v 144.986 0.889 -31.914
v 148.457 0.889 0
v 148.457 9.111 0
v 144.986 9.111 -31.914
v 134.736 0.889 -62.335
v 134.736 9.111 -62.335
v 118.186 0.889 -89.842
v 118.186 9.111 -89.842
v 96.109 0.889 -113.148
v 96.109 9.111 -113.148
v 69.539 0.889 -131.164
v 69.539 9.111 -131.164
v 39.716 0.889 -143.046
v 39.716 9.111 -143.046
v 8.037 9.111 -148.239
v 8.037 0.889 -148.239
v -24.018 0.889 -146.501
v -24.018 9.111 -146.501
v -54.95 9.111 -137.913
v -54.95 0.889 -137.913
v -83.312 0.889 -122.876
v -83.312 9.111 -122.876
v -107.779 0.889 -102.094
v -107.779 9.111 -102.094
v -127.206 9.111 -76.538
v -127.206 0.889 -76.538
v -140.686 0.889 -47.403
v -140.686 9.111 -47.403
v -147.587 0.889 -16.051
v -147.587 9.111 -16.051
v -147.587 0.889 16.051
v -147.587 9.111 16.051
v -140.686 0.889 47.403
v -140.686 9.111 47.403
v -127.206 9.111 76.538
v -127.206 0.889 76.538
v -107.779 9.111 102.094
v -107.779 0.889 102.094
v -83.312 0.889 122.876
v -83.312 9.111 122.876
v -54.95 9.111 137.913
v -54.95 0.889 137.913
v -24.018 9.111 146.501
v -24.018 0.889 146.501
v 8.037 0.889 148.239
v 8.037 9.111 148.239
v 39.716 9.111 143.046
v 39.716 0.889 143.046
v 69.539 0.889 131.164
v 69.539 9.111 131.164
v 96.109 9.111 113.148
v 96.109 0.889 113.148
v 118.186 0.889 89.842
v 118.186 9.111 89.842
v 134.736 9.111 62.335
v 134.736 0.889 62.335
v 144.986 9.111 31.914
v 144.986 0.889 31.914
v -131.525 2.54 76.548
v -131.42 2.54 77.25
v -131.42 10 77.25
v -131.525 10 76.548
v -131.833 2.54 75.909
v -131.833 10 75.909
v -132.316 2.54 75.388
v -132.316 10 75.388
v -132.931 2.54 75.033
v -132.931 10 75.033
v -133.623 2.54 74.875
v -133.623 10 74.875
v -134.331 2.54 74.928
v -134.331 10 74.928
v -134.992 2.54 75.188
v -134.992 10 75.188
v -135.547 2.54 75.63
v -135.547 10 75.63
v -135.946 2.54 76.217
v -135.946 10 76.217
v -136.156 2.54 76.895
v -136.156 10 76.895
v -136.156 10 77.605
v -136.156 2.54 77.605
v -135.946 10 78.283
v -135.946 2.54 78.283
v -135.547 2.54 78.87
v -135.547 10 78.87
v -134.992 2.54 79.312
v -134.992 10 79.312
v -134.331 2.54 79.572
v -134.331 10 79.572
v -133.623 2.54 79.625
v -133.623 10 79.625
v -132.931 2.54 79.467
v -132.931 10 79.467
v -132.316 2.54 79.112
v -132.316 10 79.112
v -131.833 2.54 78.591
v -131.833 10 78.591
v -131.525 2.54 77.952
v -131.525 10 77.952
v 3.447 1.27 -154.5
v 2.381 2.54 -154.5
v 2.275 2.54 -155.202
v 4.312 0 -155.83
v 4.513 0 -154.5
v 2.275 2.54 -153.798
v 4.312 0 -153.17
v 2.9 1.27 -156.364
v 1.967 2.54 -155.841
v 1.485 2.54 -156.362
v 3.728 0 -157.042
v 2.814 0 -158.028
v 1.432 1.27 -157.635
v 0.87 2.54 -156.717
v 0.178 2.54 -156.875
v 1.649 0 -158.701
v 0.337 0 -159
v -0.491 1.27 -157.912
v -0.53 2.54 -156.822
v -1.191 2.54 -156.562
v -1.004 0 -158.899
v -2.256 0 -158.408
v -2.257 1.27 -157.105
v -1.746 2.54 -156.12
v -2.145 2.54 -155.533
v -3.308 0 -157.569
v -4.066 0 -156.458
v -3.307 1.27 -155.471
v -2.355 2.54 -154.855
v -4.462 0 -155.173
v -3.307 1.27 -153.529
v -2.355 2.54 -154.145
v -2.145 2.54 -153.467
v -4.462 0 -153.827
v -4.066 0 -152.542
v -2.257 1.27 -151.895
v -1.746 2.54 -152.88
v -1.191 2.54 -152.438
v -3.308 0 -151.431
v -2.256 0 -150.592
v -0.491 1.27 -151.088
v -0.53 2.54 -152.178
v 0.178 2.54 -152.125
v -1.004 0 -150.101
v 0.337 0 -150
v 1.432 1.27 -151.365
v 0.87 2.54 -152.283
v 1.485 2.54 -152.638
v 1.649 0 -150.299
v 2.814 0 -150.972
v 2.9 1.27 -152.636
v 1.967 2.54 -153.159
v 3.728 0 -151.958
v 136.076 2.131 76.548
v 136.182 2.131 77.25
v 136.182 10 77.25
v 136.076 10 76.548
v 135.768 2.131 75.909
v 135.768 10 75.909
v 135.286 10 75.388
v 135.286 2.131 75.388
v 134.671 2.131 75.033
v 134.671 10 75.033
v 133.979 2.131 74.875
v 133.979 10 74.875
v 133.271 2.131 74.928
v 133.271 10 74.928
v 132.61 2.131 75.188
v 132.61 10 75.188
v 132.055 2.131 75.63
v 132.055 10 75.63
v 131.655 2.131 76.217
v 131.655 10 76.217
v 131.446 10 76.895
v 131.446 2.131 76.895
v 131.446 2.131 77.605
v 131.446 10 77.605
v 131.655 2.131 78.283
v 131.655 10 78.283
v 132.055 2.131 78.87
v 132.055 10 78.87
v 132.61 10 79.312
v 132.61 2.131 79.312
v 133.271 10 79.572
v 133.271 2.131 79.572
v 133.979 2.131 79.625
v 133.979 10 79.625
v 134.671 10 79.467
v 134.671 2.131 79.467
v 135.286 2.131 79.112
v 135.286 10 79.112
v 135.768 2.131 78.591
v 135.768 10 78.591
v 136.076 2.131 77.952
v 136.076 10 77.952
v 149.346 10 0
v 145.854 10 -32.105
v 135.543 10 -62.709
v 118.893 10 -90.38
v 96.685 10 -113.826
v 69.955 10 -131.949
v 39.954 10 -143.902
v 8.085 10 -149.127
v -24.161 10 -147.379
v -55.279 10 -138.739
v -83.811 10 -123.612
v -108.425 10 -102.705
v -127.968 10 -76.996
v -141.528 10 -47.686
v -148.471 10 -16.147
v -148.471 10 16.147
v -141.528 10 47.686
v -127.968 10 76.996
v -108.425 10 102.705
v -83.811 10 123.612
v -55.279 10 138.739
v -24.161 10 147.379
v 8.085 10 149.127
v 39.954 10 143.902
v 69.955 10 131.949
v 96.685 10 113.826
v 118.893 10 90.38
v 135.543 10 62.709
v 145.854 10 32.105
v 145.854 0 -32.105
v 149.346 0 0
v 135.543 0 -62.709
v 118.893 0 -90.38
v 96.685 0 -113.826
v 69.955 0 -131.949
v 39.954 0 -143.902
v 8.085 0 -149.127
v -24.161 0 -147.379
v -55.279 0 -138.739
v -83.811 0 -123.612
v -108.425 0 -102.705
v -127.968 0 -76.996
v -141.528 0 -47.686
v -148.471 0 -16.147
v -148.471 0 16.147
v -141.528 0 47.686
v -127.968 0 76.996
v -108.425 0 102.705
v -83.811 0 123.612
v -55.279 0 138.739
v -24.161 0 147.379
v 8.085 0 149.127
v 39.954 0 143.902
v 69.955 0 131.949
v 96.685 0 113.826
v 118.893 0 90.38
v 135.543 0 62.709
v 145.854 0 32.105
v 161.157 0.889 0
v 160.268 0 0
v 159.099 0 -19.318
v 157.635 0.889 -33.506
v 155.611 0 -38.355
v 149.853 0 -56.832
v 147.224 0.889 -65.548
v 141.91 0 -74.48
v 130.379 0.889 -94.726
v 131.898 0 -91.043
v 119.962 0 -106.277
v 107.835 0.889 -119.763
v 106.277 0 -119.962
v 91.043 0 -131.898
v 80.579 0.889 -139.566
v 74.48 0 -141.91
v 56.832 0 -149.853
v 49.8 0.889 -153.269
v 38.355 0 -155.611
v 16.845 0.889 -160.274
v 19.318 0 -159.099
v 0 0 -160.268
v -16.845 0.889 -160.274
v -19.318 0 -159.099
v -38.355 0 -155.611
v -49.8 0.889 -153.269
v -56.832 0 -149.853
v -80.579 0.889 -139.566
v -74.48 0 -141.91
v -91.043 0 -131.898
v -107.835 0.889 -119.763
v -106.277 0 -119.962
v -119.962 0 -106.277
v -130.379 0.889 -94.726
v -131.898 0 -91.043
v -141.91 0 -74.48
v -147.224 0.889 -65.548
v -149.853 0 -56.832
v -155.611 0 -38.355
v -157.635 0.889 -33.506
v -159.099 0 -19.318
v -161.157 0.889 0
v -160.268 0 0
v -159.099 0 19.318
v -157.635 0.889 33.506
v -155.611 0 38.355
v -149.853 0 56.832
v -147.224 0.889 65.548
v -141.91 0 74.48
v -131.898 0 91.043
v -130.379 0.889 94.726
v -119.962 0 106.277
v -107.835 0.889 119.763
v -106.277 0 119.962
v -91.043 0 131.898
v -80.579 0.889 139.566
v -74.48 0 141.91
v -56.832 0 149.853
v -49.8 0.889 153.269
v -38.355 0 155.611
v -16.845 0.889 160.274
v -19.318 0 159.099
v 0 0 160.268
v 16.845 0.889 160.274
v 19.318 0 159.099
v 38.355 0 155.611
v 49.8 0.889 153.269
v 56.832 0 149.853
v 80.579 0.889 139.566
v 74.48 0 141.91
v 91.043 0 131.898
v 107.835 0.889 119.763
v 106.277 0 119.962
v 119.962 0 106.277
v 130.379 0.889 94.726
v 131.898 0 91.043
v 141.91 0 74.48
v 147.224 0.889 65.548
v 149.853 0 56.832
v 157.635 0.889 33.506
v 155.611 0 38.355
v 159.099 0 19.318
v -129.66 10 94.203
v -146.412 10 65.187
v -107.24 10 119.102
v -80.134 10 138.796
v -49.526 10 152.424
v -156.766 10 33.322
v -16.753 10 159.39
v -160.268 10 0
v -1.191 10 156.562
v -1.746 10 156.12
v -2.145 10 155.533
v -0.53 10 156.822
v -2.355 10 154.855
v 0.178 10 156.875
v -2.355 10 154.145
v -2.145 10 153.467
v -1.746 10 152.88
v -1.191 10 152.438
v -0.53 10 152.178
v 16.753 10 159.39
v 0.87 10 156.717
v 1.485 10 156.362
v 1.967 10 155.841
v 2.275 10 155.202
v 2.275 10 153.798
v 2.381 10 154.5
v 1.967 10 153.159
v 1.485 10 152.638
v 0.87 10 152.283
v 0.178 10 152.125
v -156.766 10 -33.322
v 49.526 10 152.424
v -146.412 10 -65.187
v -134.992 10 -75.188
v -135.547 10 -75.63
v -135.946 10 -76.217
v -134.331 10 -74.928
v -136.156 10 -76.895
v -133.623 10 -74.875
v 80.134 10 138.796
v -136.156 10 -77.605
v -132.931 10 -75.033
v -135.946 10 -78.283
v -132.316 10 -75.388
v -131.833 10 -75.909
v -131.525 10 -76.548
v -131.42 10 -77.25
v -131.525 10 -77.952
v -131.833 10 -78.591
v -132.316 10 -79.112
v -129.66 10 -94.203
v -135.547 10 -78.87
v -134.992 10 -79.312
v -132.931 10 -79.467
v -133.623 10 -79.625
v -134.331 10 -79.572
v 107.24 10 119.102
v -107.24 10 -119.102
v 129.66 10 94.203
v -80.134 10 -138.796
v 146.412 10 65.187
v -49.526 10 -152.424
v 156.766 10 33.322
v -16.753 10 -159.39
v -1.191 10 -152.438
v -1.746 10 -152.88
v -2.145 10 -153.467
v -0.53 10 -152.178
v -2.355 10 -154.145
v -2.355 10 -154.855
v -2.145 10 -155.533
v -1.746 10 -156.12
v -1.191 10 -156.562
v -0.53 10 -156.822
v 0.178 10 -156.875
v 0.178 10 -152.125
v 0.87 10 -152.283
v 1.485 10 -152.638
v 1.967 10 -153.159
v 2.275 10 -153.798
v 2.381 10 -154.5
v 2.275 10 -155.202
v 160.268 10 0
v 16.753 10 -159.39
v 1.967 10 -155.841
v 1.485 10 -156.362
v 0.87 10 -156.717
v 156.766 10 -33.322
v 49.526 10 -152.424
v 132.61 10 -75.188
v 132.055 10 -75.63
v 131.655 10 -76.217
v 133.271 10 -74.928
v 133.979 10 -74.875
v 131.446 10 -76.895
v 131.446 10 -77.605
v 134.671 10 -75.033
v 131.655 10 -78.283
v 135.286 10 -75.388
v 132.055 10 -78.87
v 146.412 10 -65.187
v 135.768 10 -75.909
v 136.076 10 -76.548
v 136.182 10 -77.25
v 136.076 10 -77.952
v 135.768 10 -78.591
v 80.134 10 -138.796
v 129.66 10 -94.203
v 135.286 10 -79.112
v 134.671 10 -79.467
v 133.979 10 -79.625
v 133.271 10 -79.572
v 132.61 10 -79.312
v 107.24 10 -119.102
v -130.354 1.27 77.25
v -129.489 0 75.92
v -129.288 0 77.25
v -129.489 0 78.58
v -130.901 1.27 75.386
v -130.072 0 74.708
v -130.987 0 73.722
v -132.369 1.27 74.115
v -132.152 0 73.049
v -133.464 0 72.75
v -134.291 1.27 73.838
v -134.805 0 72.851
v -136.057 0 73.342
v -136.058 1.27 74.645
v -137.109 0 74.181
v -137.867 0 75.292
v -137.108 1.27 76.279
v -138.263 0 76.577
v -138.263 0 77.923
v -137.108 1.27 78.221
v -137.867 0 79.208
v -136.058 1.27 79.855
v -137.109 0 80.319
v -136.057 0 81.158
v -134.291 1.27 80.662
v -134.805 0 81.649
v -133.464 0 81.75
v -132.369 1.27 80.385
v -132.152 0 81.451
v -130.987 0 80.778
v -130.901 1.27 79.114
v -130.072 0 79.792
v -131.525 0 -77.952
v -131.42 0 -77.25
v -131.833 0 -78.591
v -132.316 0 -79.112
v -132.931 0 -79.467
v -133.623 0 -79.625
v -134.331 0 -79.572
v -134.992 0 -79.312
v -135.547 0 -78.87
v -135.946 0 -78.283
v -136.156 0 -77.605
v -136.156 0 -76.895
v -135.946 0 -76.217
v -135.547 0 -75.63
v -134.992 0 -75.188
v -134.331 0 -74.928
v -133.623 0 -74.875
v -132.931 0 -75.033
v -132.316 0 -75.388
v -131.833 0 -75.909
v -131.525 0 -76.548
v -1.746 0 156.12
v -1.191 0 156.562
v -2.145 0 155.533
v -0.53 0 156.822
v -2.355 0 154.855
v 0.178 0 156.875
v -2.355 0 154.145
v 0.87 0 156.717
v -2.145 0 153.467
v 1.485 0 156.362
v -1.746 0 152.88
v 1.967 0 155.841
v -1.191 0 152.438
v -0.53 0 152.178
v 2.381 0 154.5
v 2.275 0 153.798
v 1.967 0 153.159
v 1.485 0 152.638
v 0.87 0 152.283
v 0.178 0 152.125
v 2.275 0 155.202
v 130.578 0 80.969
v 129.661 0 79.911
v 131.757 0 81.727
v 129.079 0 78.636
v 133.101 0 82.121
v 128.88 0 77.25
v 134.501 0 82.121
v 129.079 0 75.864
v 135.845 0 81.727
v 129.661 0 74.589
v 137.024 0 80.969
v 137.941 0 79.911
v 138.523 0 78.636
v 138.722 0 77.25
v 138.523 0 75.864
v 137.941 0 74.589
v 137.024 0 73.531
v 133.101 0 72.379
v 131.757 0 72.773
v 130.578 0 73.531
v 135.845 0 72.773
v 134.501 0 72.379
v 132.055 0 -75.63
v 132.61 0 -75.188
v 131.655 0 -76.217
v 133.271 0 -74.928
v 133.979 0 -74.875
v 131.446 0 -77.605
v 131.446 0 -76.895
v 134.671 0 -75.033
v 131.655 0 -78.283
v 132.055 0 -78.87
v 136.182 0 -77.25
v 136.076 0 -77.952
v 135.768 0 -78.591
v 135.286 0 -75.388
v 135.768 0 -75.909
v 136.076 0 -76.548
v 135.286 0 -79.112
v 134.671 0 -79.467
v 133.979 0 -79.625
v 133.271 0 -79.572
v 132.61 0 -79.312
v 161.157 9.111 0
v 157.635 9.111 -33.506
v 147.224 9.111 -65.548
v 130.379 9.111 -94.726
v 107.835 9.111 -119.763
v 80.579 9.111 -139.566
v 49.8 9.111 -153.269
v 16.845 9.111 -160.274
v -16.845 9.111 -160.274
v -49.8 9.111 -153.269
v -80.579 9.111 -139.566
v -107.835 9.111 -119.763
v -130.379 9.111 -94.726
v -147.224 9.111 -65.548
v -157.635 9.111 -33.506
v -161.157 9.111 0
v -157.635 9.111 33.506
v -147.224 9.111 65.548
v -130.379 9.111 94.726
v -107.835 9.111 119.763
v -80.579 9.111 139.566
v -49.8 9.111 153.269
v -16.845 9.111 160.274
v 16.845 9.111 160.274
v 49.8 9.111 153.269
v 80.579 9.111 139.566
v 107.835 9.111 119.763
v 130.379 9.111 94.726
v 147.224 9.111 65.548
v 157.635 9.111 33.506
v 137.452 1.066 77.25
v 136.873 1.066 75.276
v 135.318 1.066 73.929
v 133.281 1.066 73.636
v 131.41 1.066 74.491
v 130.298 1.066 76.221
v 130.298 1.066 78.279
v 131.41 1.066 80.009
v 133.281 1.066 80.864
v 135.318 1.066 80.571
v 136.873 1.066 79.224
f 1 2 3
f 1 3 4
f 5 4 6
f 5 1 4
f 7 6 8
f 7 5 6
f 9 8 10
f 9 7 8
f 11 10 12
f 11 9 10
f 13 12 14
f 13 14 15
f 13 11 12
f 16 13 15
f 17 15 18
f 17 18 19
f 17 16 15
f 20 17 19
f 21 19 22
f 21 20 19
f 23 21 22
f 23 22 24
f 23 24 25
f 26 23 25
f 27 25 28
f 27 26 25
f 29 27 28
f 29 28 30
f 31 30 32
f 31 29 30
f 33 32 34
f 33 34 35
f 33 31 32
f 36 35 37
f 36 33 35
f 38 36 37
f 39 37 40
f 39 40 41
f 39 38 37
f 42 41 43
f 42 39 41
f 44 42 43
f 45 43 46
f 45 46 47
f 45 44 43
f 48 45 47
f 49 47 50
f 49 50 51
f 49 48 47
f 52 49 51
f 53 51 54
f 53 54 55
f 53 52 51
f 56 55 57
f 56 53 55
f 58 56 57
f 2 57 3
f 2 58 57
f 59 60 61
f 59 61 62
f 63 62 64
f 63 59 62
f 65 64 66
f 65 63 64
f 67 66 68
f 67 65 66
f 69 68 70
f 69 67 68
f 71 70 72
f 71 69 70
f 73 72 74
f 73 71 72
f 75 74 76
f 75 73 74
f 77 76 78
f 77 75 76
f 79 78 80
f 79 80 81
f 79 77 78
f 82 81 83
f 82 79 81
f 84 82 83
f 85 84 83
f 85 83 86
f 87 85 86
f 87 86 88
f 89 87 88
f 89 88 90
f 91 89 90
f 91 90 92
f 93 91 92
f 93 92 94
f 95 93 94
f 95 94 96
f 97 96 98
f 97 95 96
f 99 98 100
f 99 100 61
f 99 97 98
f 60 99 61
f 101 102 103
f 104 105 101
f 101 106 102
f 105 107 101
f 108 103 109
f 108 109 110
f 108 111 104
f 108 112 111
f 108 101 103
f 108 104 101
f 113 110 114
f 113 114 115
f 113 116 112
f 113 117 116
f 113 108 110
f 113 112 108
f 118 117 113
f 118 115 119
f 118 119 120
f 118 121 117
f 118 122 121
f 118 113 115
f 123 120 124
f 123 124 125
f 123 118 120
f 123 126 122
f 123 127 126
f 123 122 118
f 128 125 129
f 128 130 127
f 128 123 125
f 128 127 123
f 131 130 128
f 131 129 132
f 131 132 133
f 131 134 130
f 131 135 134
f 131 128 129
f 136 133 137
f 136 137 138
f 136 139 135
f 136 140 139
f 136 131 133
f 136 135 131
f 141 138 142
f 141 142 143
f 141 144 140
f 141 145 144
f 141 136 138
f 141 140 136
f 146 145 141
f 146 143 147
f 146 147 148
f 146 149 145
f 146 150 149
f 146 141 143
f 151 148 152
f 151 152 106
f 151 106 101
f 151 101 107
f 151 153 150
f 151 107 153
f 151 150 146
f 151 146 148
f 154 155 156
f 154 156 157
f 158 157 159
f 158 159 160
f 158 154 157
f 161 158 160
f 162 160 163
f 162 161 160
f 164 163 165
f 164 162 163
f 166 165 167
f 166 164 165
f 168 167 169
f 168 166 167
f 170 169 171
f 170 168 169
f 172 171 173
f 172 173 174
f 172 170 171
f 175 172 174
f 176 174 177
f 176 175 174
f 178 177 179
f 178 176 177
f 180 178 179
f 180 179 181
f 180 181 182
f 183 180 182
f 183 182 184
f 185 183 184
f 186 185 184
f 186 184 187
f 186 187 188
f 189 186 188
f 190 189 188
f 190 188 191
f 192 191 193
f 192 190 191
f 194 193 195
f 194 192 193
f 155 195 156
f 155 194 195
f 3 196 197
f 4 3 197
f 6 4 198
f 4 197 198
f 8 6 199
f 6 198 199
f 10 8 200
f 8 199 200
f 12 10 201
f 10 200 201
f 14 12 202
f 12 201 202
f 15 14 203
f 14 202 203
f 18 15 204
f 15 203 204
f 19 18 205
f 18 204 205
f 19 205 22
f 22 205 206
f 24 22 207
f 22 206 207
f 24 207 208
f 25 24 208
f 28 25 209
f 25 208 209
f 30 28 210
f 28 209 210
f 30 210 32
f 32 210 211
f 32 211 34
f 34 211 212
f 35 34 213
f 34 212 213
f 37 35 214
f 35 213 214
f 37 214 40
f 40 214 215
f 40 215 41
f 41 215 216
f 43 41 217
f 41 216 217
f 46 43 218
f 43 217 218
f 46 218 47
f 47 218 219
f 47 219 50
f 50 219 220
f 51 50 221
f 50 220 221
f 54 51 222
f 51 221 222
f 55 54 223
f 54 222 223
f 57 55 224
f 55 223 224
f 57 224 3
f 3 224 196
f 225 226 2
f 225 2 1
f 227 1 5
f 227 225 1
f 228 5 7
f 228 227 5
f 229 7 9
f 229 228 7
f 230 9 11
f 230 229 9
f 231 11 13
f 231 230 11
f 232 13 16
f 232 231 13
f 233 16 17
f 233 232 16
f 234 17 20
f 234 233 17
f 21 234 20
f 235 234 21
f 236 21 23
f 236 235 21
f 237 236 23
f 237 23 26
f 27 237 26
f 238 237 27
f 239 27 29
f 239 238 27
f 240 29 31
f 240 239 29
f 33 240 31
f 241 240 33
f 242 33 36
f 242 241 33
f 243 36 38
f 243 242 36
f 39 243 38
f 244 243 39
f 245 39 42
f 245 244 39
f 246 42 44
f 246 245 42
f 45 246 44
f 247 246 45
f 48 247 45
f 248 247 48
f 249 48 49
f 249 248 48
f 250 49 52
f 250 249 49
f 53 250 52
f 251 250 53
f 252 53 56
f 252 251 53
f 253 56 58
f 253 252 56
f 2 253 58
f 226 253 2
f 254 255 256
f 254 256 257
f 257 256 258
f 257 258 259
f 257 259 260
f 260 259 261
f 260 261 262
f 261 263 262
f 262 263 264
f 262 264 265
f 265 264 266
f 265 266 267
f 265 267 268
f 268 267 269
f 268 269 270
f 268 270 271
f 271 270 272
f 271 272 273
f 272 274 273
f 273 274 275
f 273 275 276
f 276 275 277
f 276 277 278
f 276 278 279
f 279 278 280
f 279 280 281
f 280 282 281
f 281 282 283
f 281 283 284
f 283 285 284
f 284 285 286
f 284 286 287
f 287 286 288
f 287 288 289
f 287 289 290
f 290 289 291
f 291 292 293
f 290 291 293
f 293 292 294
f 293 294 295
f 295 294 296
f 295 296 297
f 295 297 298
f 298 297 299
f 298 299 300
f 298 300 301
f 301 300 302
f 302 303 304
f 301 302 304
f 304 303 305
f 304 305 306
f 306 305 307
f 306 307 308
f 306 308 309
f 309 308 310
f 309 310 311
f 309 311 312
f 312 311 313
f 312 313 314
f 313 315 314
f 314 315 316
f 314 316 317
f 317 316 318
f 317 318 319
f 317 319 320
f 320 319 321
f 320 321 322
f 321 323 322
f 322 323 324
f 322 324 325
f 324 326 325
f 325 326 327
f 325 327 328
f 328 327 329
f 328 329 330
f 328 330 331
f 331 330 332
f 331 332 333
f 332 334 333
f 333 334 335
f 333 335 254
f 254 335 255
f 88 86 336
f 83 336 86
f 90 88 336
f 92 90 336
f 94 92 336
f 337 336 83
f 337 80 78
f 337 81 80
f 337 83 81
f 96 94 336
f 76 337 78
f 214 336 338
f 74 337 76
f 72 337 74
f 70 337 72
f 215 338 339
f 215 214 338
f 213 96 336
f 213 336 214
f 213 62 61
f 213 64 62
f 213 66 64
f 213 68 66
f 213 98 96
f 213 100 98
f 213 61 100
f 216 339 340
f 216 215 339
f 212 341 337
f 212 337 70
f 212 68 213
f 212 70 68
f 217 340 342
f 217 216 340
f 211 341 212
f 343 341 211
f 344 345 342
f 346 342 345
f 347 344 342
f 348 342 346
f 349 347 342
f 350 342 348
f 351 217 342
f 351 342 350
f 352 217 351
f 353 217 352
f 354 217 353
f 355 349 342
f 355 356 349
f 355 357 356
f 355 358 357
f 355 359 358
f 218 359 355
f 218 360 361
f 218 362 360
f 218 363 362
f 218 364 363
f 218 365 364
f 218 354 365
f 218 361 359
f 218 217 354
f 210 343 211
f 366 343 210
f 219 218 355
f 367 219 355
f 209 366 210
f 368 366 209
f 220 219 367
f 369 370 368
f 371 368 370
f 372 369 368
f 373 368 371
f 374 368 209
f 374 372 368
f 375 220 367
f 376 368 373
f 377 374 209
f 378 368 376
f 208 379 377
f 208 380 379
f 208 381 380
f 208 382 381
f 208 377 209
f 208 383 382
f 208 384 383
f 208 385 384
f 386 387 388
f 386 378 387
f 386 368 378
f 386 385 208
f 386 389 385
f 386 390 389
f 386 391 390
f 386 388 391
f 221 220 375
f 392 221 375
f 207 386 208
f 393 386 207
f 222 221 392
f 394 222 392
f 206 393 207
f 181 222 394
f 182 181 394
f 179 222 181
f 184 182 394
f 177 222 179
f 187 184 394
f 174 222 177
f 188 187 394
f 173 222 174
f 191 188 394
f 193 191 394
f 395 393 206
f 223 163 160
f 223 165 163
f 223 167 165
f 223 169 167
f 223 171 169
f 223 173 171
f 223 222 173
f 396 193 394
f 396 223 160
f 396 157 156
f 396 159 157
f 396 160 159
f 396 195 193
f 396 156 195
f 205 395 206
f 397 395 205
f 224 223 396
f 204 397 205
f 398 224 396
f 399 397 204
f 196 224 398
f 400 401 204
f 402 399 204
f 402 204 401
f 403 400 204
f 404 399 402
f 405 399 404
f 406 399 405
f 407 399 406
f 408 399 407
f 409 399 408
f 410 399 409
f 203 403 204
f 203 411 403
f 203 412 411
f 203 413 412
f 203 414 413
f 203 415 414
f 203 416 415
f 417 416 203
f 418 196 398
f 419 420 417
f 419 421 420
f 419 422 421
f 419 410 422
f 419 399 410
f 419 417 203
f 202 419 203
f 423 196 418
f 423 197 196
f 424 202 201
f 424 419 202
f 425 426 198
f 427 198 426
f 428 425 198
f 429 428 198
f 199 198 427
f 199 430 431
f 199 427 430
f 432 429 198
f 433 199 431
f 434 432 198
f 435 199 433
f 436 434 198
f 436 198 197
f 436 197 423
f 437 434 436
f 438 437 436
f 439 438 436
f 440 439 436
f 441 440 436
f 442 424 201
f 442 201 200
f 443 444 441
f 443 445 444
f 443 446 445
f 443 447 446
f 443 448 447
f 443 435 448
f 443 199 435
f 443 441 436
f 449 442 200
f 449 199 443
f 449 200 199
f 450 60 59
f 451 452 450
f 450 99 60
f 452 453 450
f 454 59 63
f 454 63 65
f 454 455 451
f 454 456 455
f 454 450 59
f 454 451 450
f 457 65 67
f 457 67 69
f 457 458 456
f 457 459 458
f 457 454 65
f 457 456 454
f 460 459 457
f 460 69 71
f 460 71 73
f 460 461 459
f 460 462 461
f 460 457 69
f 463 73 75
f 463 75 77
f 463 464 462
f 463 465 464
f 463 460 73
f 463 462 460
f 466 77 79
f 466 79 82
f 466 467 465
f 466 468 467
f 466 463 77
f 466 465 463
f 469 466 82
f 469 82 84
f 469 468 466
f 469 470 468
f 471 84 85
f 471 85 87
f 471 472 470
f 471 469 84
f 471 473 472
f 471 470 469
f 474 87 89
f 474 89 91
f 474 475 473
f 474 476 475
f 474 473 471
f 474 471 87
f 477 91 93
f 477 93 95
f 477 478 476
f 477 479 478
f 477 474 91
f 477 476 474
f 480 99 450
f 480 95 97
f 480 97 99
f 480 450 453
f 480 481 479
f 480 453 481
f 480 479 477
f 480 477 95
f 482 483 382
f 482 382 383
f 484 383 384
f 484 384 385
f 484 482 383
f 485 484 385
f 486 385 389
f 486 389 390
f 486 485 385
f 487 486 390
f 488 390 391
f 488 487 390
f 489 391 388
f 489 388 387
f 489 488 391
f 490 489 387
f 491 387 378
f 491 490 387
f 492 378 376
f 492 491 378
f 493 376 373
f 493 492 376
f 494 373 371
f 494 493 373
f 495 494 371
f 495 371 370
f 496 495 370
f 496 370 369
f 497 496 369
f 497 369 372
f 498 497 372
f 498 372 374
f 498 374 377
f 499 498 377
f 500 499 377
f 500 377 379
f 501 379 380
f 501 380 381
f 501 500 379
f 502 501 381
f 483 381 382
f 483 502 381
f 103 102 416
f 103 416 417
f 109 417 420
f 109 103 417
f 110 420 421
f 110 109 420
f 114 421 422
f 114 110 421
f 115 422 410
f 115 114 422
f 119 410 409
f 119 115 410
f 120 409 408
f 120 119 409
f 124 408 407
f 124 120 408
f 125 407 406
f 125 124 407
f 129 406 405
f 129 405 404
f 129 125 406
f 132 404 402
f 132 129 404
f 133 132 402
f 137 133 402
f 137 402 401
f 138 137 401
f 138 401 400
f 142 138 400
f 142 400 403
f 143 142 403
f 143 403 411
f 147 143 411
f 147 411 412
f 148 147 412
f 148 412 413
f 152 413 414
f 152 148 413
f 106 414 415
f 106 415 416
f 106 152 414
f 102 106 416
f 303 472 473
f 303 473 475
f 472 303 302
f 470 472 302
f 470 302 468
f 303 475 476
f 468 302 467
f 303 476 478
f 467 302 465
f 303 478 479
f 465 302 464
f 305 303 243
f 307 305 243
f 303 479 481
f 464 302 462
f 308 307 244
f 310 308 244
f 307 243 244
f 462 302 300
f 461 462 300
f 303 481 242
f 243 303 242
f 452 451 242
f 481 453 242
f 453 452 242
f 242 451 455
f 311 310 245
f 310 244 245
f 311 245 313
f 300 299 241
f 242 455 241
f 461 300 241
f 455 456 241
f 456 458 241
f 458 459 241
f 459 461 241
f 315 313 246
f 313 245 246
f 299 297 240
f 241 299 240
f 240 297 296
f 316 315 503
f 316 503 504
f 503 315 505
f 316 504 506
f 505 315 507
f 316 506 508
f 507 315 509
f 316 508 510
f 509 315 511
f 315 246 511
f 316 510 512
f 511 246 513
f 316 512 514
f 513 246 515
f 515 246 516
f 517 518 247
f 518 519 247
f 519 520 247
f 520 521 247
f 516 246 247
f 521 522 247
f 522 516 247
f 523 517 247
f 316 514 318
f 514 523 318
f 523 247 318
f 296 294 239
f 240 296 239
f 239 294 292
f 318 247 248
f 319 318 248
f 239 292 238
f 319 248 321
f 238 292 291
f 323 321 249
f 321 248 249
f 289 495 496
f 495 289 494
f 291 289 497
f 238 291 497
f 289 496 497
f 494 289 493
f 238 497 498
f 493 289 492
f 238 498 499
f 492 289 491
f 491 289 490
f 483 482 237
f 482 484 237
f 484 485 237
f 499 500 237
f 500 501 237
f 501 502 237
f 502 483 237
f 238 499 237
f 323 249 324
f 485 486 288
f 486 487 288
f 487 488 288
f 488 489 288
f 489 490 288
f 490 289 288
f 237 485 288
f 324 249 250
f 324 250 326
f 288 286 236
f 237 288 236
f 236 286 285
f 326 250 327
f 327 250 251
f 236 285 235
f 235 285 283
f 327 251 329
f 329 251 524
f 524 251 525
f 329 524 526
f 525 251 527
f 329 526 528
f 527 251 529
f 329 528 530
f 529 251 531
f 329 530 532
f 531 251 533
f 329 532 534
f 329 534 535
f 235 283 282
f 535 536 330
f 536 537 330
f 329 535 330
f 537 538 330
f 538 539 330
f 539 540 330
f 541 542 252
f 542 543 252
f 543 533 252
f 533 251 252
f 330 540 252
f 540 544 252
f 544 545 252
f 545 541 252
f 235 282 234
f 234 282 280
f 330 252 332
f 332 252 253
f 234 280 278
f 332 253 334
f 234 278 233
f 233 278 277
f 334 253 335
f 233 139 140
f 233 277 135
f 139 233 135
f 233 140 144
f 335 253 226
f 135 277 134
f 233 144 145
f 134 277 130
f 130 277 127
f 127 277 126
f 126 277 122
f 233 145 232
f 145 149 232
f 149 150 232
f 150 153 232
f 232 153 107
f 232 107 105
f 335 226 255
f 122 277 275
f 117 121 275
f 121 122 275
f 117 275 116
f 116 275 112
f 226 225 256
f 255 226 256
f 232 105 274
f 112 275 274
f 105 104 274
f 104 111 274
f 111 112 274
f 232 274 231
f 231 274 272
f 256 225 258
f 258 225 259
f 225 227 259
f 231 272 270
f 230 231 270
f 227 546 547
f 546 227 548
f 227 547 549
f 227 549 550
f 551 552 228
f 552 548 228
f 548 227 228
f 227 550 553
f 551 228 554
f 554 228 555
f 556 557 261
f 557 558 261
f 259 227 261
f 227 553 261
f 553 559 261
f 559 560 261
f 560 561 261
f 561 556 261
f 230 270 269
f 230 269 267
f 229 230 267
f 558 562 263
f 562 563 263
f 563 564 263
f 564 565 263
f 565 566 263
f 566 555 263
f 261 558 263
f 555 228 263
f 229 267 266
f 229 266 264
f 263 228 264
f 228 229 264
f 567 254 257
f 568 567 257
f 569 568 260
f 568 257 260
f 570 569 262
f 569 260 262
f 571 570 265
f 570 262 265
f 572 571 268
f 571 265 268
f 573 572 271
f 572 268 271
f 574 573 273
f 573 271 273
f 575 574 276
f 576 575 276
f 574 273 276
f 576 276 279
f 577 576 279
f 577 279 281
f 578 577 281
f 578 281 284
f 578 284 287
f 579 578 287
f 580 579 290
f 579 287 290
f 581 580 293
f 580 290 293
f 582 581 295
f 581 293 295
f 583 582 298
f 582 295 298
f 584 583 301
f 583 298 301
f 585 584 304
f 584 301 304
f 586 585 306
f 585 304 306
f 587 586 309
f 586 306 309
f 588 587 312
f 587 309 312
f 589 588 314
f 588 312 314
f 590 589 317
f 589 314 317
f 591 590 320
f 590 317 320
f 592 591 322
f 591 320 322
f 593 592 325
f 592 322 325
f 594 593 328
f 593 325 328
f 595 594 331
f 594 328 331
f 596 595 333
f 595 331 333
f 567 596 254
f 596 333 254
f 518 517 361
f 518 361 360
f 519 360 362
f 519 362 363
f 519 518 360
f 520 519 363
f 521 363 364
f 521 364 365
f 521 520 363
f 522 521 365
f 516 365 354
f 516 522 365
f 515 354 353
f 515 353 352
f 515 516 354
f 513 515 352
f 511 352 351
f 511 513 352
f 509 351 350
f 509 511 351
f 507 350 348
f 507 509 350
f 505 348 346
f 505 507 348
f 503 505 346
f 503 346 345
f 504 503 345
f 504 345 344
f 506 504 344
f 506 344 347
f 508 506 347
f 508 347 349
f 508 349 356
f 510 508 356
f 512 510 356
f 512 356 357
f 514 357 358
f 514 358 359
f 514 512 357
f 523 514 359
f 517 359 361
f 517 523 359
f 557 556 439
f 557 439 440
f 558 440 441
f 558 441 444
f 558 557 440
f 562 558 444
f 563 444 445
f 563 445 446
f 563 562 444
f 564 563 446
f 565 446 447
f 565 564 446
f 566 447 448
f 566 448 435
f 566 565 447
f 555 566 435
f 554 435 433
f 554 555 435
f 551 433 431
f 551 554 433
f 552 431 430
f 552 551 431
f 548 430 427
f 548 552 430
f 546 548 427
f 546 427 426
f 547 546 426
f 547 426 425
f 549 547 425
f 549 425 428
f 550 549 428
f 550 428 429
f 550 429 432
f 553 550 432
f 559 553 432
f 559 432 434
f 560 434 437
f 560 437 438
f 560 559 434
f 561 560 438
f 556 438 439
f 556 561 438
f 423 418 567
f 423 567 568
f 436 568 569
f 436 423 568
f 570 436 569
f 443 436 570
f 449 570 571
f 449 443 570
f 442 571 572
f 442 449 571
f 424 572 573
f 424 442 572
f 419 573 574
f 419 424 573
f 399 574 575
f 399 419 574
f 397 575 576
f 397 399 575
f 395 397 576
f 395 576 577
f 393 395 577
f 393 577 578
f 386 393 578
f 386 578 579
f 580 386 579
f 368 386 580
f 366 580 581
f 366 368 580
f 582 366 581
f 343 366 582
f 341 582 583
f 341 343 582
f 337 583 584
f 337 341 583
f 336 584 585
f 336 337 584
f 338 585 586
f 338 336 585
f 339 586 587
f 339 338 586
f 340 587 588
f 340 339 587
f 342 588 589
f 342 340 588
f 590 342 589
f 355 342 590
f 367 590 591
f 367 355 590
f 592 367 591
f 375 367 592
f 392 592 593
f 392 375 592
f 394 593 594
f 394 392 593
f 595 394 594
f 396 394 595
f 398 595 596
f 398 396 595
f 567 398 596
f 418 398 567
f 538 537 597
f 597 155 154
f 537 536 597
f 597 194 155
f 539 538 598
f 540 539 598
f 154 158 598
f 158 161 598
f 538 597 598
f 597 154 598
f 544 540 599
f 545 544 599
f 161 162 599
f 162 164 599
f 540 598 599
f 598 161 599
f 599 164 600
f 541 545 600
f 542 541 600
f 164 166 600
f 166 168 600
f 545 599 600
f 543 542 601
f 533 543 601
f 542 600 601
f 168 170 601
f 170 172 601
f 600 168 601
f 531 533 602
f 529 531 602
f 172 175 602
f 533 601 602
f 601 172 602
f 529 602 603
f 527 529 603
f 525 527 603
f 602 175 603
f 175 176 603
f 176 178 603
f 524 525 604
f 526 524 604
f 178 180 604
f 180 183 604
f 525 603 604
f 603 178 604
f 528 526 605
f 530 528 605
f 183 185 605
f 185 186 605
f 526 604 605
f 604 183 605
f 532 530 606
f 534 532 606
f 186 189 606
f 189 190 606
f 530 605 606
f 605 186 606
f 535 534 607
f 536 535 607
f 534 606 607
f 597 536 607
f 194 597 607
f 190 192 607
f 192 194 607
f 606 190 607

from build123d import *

# Parameters (mm, degrees)
SKETCH1_R             = 161.157000012
SKETCH1_R_2           = 148.457000012
SKETCH1_R_3           = 2.38125
BOSS_EXTRUDE1_DEPTH   = 10
CHAMFER1_SIZE         = 0.889
CHAMFER2_SIZE         = 2.54
CHAMFER2_SIZE2        = 2.131313063
CHAMFER2_PART_2_SIZE  = 2.54
CHAMFER2_PART_2_SIZE2 = 2.131313063
CHAMFER2_PART_3_SIZE  = 2.54
CHAMFER2_PART_3_SIZE2 = 2.131313063


with BuildPart() as part:
    # Sketch1 → Boss-Extrude1 (new body)
    with BuildSketch(Plane(origin=(0, 0, 0), x_dir=(1, 0, 0), z_dir=(0, 1, 0))):
        Circle(SKETCH1_R)
        Circle(SKETCH1_R_2, mode=Mode.SUBTRACT)
        with Locations((0, 154.5)):
            Circle(SKETCH1_R_3, mode=Mode.SUBTRACT)
        with Locations((133.800924885, 77.25)):
            Circle(SKETCH1_R_3, mode=Mode.SUBTRACT)
        with Locations((133.800924885, -77.25)):
            Circle(SKETCH1_R_3, mode=Mode.SUBTRACT)
        with Locations((0, -154.5)):
            Circle(SKETCH1_R_3, mode=Mode.SUBTRACT)
        with Locations((-133.800924885, -77.25)):
            Circle(SKETCH1_R_3, mode=Mode.SUBTRACT)
        with Locations((-133.800924885, 77.25)):
            Circle(SKETCH1_R_3, mode=Mode.SUBTRACT)
    extrude(amount=BOSS_EXTRUDE1_DEPTH)

    # Chamfer1
    chamfer1_edges = [part.edges().sort_by_distance(p)[0] for p in [
        (-161.157000012, 0, 0),
        (-161.157000012, 10, 0),
        (-148.457000012, 0, 0),
        (-148.457000012, 10, 0),
    ]]
    chamfer(chamfer1_edges, length=CHAMFER1_SIZE)

    # Chamfer2
    chamfer2_edges = [part.edges().sort_by_distance(p)[0] for p in [
        (131.419674885, 0, 77.25),
    ]]
    chamfer2_side = [part.faces().sort_by_distance(p)[0] for p in [
        (-155.734936427, 0, 0),
    ]]
    chamfer(chamfer2_edges, length=CHAMFER2_SIZE, length2=CHAMFER2_SIZE2, reference=chamfer2_side[0])

    # Chamfer2 part 2
    chamfer2_part_2_edges = [part.edges().sort_by_distance(p)[0] for p in [
        (-136.182174885, 0, 77.25),
    ]]
    chamfer2_part_2_side = [part.faces().sort_by_distance(p)[0] for p in [
        (-136.182174885, 5, 77.25),
    ]]
    chamfer(chamfer2_part_2_edges, length=CHAMFER2_PART_2_SIZE, length2=CHAMFER2_PART_2_SIZE2, reference=chamfer2_part_2_side[0])

    # Chamfer2 part 3
    chamfer2_part_3_edges = [part.edges().sort_by_distance(p)[0] for p in [
        (-2.38125, 0, -154.5),
    ]]
    chamfer2_part_3_side = [part.faces().sort_by_distance(p)[0] for p in [
        (-2.38125, 5, -154.5),
    ]]
    chamfer(chamfer2_part_3_edges, length=CHAMFER2_PART_3_SIZE, length2=CHAMFER2_PART_3_SIZE2, reference=chamfer2_part_3_side[0])


solid = part.part
